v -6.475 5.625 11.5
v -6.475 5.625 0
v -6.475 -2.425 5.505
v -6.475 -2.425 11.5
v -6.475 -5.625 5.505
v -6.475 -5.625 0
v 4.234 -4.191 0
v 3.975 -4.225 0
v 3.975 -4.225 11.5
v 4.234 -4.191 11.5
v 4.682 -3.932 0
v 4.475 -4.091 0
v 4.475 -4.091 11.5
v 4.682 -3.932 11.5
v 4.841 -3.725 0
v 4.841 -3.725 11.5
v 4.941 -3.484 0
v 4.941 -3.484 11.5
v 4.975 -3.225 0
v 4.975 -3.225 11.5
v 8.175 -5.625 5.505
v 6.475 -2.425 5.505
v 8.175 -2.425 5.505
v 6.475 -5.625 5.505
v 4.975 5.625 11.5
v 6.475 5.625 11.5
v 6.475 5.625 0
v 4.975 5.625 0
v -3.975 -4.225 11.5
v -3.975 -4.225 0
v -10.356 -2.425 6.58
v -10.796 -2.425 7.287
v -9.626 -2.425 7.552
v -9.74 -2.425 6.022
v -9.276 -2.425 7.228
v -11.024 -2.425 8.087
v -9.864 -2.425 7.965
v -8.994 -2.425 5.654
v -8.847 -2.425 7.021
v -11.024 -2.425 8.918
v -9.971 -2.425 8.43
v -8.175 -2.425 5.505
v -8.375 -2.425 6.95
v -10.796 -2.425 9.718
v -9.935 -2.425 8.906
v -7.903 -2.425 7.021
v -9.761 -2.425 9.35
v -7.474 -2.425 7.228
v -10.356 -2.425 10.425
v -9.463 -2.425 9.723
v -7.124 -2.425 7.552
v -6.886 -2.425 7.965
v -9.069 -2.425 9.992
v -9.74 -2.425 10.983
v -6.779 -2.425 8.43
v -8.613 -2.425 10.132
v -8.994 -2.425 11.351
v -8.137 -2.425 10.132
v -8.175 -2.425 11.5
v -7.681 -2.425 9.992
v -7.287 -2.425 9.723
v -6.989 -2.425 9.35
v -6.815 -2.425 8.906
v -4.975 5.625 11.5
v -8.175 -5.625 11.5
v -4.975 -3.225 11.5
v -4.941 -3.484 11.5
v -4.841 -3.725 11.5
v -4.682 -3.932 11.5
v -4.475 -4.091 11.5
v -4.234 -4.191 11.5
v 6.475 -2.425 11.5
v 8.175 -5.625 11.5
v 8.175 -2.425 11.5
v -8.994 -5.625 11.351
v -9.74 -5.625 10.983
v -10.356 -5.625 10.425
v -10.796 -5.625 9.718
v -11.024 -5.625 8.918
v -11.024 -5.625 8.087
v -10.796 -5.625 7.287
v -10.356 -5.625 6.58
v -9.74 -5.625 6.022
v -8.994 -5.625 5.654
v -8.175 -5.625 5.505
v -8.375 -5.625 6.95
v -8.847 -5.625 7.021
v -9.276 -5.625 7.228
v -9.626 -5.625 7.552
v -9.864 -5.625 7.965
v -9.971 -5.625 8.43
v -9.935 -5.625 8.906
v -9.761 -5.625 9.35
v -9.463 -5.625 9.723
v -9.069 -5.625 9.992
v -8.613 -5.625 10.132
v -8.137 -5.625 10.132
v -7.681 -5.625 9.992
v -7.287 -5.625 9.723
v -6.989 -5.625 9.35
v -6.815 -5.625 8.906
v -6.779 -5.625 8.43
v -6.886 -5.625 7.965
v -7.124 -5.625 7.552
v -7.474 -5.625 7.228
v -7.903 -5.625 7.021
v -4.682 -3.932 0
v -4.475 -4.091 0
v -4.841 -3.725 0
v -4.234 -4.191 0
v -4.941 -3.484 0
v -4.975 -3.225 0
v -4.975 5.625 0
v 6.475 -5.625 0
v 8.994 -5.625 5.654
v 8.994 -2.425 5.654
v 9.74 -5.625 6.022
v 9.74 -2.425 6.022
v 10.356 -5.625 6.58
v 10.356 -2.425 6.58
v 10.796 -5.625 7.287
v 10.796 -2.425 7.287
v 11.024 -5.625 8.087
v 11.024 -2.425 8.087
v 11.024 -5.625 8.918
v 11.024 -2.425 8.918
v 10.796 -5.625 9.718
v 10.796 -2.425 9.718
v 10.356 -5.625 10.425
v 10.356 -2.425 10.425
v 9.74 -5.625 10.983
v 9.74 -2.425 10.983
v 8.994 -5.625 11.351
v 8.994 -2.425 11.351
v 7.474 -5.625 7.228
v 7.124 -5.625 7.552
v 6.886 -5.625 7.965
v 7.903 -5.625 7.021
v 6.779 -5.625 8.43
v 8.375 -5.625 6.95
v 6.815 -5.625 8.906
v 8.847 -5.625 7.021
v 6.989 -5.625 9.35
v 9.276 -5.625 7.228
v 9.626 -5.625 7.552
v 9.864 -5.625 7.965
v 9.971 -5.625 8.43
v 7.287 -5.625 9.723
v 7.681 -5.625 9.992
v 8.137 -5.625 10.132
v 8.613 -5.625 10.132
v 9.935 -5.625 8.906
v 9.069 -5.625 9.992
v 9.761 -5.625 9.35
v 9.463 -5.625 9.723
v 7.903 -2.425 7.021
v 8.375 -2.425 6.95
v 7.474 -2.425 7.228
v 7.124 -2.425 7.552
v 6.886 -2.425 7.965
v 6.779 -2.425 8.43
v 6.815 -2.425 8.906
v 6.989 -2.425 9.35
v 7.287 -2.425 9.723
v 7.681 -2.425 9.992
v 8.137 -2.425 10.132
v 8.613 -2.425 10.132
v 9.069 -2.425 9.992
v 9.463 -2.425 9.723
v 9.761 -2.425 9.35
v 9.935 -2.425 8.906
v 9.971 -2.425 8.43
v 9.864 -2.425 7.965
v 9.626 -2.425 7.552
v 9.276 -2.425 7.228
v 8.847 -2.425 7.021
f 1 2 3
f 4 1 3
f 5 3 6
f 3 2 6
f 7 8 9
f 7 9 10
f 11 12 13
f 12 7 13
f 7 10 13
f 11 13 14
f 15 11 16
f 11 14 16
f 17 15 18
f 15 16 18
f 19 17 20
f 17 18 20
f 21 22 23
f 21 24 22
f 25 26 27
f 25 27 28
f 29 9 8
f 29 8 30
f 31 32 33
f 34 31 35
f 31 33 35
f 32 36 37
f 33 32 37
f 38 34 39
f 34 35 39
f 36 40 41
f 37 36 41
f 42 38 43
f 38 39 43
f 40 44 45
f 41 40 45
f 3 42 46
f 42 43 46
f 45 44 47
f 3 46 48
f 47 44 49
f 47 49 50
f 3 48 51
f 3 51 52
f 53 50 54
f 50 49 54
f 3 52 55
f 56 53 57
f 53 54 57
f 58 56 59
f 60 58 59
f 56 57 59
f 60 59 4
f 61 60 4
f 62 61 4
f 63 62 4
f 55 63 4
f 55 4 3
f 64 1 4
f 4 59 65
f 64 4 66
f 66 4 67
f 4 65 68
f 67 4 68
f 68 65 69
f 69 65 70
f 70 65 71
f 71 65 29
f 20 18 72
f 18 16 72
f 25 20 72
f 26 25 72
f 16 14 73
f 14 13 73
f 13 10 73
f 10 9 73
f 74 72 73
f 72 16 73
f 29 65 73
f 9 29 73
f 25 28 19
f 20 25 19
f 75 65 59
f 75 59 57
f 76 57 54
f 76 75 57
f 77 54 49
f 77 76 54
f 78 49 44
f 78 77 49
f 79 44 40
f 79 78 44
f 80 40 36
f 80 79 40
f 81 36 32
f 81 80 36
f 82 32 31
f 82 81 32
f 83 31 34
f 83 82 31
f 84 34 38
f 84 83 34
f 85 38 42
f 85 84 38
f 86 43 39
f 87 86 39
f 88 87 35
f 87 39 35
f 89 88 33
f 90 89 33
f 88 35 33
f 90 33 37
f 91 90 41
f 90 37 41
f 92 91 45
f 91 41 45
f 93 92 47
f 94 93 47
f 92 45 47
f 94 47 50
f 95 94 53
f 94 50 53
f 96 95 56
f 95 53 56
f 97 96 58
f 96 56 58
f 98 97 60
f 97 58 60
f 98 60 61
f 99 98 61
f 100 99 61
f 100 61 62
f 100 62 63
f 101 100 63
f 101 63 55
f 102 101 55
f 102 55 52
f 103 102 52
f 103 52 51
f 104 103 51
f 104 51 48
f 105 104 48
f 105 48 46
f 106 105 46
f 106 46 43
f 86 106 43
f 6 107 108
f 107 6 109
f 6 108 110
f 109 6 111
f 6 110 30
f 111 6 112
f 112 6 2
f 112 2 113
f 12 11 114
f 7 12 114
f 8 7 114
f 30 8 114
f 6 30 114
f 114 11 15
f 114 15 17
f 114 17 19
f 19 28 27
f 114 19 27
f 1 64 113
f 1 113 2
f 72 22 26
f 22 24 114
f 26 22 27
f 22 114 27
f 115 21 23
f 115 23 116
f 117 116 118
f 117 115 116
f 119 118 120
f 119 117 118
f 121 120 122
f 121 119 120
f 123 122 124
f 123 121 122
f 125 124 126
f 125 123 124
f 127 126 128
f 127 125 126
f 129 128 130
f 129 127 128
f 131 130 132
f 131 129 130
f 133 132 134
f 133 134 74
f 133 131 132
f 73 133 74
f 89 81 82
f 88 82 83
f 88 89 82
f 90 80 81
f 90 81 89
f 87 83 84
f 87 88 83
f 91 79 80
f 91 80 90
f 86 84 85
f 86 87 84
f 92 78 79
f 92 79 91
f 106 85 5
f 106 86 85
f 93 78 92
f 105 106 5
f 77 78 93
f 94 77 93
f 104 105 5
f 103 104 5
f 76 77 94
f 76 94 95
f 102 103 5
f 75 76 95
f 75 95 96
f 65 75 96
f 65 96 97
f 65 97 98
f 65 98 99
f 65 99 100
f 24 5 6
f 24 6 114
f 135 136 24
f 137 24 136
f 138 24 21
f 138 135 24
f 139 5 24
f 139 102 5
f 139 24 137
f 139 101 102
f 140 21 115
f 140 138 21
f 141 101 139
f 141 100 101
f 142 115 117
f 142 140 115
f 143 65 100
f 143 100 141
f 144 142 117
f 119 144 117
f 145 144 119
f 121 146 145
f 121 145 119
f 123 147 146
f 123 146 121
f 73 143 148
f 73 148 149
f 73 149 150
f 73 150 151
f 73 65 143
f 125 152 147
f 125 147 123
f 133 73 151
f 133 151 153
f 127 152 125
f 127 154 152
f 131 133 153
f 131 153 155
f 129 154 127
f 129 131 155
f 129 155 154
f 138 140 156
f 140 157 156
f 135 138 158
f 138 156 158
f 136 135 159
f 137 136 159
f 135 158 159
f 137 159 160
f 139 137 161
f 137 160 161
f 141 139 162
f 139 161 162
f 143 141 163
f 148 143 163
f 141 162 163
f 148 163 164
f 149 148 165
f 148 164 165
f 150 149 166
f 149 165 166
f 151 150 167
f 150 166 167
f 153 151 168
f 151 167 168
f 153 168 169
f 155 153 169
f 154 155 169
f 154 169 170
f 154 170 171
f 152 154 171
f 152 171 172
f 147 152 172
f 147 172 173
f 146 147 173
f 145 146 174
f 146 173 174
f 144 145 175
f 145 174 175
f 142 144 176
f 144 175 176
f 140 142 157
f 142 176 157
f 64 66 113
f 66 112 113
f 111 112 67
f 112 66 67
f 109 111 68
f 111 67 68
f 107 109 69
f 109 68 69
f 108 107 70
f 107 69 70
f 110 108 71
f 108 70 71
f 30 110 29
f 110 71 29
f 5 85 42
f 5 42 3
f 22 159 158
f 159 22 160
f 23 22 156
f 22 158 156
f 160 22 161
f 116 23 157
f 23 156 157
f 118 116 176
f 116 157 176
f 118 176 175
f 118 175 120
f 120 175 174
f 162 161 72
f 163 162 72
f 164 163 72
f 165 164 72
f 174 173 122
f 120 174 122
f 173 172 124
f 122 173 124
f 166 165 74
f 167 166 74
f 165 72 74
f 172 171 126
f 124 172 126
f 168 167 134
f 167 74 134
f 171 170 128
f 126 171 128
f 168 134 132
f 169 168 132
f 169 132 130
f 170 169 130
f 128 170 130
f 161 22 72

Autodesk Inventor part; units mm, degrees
ref_plane "YZ Plane" through (0, 0, 0) normal (1, 0, 0) x (0, 1, 0)
ref_plane "XZ Plane" through (0, 0, 0) normal (0, 1, 0) x (-1, 0, 0)
sketch "草图1" plane through (0, 0, 0) normal (0, 0, 1) x (1, 0, 0)
  line L0 (-6.475, -5.625) -> (6.475, -5.625)
  line L1 (6.475, -5.625) -> (6.475, 5.625)
  line L2 (6.475, 5.625) -> (-6.475, 5.625)
  line L3 (-6.475, 5.625) -> (-6.475, -5.625)
  line L4 (-6.475, -5.625) -> (6.475, 5.625) construction
  line L5 (6.475, -5.625) -> (-6.475, 5.625) construction
  line L6 (4.975, -4.225) -> (-4.975, -4.225)
  line L7 (-4.975, -4.225) -> (-4.975, 5.625)
  line L8 (-4.975, 5.625) -> (4.975, 5.625)
  line L9 (4.975, 5.625) -> (4.975, -4.225)
  line L10 (4.975, -4.225) -> (-4.975, 5.625) construction
  line L11 (-4.975, -4.225) -> (4.975, 5.625) construction
  line L12 (0, -7.875) -> (0, 7.875) projected
  point P0 (0, 0)
  point P1 (0, 0.7)
  point P2 (0, 0.7)
  dimension "d0" = 11.25
  dimension "d1" = 9.85
  dimension "d2" = 9.95
  dimension "d3" = 1.5
extrude "拉伸1" add sketch "草图1" along normal blind 11.5 contours L3 L2 L7 L6 L12 L0 | L12 L6 L9 L2 L1 L0
sketch "草图2" plane through (-6.475, -5.625, 0) normal (0, -1, 0) x (1, 0, 0)
  line L0 (0, 0) -> (12.95, 0) projected
  line L1 (12.95, 0) -> (12.95, 11.5) projected
  line L2 (0, 11.5) -> (12.95, 11.5) projected
  line L3 (0, 0) -> (0, 11.5) projected
  line L4 (0, 11.5) -> (12.95, 11.5) construction
  line L5 (6.475, 11.5) -> (6.475, 0) construction
  line L6 (12.95, 11.5) -> (11.45, 11.5) construction
  line L7 (12.95, 11.5) -> (14.65, 11.5)
  line L8 (12.95, 0) -> (12.95, 11.5) construction
  line L9 (12.95, 5.505) -> (14.65, 5.505)
  arc A0 (14.65, 5.505) -> (14.65, 11.5) centre (14.5281, 8.5025) ccw
  line L10 (0, 11.5) -> (-1.7, 11.5)
  line L11 (0, 5.505) -> (-1.7, 5.505)
  arc A1 (-1.7, 11.5) -> (-1.7, 5.505) centre (-1.5781, 8.5025) ccw
  point P0 (14.85, 8.55)
  point P1 (-1.9, 8.55)
  dimension "d6" = 1.7
  dimension "d7" = 3
  dimension "d8" = 1.9
  dimension "d9" = 2.95
extrude "拉伸2" add sketch "草图2" against normal blind 3.2 contours L1 L7 A0 L9
ref_plane "工作平面1" through (0, -5.625, 0) normal (1, 0, 0) x (0, 0, -1)
mirror "镜像1" about plane through (0, -5.625, 0) normal (1, 0, 0) of "拉伸2"
hole "孔1" at (8.375, -5.625, 8.55) at (-8.375, -5.625, 8.55) direction (0, 1, 0) diameter 3.2 end through all
fillet "圆角1" radius 1 2 edges at (4.975, -4.225, 5.75) (-4.975, -4.225, 5.75)
properties part number "N20电机座"
